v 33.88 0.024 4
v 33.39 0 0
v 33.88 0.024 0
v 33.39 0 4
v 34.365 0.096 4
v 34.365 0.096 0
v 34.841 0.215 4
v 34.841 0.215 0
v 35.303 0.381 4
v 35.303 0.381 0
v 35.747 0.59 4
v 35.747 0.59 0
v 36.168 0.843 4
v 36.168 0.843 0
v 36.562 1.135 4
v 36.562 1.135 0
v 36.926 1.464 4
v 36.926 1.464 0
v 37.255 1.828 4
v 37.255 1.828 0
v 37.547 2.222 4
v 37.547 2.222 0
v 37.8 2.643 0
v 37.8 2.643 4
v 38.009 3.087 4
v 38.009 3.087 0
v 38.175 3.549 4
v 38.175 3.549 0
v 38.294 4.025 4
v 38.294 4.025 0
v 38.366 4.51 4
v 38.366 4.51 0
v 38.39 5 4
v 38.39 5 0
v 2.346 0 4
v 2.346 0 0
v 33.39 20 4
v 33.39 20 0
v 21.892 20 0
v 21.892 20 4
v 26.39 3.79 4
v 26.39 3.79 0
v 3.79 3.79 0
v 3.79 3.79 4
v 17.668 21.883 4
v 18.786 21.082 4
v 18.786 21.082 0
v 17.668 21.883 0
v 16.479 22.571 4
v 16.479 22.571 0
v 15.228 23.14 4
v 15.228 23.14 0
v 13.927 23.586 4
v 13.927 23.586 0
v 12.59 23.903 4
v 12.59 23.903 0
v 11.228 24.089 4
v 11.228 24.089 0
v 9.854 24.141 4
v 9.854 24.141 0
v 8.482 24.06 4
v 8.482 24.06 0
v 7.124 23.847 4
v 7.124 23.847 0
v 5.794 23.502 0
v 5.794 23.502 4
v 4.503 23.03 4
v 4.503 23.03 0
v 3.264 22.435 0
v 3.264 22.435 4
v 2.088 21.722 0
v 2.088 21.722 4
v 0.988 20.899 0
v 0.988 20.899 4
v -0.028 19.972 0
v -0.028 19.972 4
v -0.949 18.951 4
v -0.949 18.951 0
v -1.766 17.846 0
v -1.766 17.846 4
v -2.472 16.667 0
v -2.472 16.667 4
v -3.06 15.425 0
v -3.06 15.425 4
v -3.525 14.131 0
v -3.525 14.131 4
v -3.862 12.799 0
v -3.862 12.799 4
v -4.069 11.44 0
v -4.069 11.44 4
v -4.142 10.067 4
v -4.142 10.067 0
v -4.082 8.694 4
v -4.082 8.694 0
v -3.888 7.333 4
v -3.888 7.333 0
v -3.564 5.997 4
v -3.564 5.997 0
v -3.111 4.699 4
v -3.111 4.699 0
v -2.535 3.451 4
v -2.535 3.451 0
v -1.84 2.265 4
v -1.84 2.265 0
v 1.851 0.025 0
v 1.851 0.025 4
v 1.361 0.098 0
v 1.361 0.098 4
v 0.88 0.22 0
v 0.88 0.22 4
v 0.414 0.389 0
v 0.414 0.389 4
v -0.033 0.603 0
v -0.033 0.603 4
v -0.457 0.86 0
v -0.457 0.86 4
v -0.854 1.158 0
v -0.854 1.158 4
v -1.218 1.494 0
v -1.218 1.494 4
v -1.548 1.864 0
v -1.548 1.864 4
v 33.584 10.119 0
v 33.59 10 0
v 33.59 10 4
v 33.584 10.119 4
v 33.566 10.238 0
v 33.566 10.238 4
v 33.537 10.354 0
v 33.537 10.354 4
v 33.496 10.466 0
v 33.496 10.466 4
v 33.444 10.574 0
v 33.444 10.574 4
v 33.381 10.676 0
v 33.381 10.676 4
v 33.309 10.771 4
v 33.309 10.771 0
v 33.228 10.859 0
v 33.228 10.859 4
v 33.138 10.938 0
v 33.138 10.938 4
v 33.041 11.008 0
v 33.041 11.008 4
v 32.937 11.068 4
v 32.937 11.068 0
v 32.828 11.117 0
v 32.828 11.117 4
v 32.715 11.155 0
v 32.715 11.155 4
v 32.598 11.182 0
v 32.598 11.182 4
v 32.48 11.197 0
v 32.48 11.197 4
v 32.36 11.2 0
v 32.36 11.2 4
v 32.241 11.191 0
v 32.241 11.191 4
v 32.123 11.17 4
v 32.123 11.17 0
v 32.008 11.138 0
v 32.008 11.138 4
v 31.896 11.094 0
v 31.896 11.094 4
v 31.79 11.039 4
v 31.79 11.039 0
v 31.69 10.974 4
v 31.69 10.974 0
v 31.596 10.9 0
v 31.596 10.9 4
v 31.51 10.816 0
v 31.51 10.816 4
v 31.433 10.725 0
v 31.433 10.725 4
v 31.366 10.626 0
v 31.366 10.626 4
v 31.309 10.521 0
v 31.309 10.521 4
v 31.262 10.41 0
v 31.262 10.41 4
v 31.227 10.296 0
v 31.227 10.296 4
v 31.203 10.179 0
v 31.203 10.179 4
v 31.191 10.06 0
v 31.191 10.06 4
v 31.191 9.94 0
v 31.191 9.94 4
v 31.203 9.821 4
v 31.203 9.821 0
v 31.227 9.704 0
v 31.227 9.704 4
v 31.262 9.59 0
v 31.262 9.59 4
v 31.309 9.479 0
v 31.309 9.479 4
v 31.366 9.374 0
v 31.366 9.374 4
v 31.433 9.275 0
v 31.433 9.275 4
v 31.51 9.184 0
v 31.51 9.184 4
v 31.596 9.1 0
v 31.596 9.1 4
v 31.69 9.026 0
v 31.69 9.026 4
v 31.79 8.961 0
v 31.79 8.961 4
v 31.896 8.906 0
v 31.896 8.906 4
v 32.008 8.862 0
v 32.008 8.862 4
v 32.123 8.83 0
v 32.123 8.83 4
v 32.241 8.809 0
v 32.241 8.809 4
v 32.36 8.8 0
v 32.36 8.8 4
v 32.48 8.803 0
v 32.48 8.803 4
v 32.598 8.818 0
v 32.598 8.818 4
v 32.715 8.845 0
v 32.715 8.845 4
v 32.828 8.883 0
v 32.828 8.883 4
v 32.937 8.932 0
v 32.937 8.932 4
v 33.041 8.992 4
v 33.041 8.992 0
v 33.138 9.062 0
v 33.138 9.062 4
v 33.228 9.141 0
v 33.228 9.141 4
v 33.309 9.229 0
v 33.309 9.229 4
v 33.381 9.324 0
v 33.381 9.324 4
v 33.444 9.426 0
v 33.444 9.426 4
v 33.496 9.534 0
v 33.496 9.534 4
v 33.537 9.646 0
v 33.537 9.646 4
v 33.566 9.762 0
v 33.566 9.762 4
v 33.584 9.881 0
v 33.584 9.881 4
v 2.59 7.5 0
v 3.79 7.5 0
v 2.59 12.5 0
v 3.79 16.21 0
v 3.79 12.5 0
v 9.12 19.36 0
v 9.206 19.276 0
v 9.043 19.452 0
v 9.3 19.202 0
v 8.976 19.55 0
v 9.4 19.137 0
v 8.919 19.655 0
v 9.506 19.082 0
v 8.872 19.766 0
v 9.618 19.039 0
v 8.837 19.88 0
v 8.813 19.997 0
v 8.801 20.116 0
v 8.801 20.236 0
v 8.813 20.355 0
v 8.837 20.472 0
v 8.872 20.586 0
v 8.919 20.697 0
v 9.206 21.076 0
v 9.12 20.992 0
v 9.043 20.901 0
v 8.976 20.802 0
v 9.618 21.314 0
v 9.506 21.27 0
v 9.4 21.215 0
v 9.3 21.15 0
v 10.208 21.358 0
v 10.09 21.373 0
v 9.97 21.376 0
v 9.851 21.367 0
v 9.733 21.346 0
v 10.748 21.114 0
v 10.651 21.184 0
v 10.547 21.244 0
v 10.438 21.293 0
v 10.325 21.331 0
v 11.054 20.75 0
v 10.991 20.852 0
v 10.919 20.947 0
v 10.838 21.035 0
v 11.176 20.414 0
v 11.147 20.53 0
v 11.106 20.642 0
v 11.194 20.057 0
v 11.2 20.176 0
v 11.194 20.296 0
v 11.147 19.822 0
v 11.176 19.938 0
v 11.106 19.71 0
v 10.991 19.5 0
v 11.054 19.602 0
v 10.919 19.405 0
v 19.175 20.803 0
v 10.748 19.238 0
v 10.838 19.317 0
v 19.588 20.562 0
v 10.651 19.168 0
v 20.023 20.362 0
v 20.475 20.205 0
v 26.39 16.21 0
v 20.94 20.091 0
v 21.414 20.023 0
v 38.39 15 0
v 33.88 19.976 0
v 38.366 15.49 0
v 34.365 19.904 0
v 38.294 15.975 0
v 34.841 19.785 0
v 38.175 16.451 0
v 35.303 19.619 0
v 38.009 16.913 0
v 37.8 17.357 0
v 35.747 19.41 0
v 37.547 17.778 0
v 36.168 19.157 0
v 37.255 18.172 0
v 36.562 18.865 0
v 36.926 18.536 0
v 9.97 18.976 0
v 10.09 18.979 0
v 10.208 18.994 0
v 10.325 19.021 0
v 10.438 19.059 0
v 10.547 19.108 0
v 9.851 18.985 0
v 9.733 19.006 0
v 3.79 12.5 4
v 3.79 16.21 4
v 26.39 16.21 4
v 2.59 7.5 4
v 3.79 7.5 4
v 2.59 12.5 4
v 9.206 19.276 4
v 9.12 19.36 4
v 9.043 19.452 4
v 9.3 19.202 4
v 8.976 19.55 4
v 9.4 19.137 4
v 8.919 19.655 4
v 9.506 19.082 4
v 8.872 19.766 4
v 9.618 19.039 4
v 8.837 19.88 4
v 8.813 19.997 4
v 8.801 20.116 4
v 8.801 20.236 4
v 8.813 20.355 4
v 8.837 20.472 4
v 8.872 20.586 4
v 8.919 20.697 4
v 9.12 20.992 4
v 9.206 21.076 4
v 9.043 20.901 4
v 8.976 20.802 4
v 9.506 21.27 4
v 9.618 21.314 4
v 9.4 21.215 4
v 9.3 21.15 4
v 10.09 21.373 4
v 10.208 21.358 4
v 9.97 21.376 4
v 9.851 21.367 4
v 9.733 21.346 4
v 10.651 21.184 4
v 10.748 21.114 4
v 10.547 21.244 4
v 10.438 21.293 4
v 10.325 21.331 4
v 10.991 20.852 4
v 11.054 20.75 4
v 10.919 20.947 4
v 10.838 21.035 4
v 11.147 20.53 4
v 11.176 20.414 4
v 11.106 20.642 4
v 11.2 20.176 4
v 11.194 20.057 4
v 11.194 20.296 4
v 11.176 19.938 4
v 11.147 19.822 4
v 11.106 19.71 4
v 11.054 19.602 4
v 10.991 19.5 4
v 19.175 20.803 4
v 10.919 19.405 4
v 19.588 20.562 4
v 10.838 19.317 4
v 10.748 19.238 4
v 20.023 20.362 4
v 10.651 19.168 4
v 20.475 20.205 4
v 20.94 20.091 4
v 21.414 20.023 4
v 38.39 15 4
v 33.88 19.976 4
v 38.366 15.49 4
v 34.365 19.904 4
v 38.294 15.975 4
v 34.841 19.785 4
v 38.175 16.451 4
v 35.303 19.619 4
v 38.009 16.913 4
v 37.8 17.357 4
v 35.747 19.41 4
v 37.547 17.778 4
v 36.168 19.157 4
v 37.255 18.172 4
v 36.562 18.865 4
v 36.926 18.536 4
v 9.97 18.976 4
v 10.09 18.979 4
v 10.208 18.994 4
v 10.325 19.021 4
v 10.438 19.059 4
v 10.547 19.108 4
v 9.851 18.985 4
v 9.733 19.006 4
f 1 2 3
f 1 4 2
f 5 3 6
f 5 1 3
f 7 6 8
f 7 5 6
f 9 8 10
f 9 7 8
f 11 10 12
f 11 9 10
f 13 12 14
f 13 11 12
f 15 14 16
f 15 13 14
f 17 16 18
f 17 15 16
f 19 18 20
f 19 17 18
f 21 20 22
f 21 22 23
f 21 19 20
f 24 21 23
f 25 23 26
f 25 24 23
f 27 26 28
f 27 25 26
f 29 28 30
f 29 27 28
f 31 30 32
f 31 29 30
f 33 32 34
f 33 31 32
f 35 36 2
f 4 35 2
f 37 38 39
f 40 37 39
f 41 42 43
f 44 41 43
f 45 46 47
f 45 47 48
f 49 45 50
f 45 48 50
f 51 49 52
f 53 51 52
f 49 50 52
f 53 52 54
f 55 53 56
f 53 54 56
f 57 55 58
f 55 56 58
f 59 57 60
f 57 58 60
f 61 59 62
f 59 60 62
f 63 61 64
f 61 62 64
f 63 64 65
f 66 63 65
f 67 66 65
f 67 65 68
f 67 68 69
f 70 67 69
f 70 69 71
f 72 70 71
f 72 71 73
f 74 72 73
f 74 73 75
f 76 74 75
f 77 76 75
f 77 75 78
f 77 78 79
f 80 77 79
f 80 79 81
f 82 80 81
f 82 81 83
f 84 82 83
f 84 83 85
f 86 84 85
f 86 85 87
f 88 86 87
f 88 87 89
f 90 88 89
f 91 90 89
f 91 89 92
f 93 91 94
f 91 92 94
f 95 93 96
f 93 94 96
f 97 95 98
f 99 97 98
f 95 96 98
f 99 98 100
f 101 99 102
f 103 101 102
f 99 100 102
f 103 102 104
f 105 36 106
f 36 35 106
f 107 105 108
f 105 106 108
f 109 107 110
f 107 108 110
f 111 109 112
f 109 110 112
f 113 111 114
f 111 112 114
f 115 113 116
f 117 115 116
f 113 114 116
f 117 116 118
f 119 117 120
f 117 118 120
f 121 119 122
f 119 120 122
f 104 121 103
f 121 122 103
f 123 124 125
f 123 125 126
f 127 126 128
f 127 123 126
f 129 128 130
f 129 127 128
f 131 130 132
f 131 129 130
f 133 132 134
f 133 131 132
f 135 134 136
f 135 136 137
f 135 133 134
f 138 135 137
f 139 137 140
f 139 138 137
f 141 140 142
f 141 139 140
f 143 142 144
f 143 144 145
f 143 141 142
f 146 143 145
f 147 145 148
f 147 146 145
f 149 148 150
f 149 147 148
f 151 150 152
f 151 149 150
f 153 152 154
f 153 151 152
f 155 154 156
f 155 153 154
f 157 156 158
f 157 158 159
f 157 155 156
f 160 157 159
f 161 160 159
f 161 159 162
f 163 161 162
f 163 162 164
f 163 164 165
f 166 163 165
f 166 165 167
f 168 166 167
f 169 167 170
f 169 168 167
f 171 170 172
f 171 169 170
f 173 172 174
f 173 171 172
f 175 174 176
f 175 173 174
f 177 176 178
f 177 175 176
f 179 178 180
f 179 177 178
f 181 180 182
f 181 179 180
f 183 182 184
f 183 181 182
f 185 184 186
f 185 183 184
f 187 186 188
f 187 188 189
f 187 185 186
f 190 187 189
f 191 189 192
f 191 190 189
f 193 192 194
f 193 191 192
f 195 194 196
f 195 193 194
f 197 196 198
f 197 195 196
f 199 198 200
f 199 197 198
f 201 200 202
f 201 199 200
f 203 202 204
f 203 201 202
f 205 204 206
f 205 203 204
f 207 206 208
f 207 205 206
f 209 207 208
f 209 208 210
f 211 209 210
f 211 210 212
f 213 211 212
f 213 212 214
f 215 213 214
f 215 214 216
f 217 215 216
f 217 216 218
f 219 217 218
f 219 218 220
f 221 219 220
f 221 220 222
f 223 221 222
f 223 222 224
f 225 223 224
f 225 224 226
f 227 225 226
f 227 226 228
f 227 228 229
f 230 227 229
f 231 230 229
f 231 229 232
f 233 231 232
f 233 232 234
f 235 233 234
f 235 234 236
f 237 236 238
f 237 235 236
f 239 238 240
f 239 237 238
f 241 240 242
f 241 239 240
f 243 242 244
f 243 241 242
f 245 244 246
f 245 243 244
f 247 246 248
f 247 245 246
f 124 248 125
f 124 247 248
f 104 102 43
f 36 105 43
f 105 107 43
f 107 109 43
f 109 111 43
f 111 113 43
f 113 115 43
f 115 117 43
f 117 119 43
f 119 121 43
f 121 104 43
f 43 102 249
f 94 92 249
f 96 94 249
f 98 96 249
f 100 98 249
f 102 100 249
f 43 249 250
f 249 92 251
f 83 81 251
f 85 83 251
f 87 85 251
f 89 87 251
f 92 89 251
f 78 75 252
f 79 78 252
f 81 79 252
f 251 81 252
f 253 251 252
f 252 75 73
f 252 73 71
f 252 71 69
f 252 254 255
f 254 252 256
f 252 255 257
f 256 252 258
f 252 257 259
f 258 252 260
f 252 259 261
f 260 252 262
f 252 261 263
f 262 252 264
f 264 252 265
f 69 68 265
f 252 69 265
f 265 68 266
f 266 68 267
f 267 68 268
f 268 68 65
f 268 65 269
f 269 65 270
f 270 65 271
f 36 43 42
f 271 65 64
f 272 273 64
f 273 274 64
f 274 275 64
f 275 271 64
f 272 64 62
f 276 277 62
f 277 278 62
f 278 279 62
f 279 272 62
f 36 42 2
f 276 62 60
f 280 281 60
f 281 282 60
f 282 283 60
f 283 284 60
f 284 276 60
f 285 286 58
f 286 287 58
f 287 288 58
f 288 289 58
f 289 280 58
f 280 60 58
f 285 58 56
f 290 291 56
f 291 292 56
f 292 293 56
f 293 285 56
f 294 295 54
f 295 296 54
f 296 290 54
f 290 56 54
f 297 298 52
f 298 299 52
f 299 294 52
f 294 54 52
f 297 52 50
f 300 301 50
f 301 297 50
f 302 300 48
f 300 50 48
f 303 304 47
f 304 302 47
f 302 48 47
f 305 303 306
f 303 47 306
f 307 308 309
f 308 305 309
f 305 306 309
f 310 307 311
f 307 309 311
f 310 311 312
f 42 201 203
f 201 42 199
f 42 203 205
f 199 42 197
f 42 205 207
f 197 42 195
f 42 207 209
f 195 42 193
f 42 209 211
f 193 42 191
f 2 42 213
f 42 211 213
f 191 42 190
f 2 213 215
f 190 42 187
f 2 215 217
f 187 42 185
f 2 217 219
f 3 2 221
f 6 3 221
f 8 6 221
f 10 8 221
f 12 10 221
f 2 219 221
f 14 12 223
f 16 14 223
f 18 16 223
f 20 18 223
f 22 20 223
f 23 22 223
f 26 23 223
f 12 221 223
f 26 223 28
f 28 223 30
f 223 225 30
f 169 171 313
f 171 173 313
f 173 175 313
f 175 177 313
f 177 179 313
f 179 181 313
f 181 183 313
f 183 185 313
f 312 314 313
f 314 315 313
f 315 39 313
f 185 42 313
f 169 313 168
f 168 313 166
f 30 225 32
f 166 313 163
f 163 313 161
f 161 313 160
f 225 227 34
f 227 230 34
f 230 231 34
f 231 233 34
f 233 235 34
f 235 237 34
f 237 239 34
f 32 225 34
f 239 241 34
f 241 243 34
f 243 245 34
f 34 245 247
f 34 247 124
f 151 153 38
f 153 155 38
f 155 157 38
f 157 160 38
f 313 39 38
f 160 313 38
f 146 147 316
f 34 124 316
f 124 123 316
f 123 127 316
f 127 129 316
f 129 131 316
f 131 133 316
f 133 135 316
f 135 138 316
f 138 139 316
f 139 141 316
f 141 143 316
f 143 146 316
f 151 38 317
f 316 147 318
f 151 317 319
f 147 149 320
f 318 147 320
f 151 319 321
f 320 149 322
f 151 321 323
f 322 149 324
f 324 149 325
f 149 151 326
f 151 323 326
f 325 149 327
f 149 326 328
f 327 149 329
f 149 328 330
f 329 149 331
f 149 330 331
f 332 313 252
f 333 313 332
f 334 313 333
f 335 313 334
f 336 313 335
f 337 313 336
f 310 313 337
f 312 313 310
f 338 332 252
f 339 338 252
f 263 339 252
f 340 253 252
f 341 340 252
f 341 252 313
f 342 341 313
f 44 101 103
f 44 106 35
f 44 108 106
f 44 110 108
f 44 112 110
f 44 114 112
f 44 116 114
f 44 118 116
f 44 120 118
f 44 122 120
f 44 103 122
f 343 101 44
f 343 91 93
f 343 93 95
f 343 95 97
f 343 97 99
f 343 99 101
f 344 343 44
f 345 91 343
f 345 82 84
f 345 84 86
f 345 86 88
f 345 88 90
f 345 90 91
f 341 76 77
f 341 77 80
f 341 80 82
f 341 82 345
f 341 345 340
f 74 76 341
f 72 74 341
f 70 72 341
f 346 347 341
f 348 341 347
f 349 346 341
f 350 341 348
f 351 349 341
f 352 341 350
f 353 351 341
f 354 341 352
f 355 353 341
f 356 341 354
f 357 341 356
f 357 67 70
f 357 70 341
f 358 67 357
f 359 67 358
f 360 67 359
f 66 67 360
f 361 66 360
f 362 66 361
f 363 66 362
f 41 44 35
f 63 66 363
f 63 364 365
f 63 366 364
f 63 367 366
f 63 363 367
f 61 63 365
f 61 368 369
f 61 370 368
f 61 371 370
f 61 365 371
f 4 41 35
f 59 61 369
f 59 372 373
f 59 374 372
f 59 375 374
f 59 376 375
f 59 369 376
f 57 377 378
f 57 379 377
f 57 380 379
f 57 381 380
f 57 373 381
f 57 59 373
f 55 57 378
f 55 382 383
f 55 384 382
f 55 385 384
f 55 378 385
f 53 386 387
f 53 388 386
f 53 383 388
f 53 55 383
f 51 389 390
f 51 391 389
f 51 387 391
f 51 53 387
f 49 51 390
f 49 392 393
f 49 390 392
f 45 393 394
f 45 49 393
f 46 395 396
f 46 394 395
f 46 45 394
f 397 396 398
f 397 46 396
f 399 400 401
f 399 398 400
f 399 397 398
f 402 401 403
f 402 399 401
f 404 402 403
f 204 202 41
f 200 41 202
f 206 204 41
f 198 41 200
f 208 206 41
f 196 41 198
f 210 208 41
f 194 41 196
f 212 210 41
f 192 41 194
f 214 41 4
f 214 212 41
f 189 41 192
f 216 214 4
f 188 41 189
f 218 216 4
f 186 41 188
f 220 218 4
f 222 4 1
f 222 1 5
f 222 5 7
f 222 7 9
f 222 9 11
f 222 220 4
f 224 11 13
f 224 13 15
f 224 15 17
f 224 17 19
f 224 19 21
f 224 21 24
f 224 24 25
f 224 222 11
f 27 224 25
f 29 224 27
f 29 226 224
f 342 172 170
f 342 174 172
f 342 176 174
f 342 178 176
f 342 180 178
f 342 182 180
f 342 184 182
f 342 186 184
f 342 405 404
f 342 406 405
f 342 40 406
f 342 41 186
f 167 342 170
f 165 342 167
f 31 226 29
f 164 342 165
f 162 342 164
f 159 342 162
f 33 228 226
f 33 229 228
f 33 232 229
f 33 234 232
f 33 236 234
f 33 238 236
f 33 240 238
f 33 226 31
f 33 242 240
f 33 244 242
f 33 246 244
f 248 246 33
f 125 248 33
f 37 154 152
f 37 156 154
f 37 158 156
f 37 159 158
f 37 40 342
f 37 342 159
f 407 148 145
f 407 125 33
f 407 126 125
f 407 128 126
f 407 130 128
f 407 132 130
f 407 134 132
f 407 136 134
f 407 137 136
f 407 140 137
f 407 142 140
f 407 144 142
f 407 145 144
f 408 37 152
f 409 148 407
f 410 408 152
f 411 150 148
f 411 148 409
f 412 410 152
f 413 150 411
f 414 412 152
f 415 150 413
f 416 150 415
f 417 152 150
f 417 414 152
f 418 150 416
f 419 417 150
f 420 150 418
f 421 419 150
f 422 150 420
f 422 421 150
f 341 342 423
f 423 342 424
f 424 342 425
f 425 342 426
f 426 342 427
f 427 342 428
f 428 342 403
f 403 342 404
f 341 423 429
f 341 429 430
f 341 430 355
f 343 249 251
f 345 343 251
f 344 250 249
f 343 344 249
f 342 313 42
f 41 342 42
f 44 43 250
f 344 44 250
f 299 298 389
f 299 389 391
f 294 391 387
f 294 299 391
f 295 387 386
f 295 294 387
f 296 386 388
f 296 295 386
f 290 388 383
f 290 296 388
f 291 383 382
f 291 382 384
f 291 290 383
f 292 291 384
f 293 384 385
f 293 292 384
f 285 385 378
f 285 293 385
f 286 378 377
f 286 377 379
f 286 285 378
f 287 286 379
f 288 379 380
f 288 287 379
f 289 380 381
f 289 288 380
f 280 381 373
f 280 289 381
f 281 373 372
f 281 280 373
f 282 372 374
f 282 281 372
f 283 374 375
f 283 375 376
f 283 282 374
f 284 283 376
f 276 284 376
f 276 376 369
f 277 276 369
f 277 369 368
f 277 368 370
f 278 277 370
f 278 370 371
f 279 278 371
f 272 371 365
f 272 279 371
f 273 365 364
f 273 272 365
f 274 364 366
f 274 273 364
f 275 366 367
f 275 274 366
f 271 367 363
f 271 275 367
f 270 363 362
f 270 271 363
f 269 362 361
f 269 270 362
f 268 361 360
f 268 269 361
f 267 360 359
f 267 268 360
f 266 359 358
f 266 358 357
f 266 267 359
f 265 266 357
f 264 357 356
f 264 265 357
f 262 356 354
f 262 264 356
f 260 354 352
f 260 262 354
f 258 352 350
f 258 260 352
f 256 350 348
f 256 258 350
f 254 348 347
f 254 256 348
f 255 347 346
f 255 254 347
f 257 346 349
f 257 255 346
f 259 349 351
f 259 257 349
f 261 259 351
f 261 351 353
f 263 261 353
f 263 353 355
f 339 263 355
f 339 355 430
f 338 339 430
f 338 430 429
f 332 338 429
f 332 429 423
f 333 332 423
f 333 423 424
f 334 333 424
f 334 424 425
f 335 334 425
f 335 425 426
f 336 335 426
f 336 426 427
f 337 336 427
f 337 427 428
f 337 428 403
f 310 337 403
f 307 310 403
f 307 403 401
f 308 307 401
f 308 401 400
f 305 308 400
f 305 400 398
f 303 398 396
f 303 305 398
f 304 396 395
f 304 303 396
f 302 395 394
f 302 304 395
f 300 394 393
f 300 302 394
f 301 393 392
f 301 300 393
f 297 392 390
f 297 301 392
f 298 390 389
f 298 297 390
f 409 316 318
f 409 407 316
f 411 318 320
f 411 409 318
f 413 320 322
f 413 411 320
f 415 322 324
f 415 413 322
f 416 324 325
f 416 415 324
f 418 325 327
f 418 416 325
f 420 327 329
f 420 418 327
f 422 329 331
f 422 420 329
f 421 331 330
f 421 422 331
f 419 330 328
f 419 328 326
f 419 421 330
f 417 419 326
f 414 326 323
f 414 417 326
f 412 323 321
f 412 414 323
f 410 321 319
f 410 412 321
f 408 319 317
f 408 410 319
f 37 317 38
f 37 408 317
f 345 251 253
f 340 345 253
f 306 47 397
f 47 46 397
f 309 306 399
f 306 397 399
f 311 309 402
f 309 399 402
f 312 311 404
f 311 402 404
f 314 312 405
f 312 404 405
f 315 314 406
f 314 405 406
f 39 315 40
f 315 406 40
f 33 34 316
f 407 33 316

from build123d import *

# Parameters (mm, degrees)
SKETCH1_R           = 1.2
BOSS_EXTRUDE1_DEPTH = 4
FILLET1_R           = 5


with BuildPart() as part:
    # Sketch1 → Boss-Extrude1 (new body)
    with BuildSketch(Plane.XY):
        with BuildLine():
            Line((0, 0), (38.39, 0))
            Line((38.39, 0), (38.39, 20))
            Line((38.39, 20), (20, 20))
            ThreePointArc((20, 20), (0, 20), (0, 0))
        make_face()
        Polygon((3.79, 3.79), (3.79, 7.5), (2.59, 7.5), (2.59, 12.5), (3.79, 12.5), (3.79, 16.21), (26.39, 16.21), (26.39, 3.79), align=None, mode=Mode.SUBTRACT)
        with Locations((10, 20.176067812)):
            Circle(SKETCH1_R, mode=Mode.SUBTRACT)
        with Locations((32.39, 10)):
            Circle(SKETCH1_R, mode=Mode.SUBTRACT)
    extrude(amount=BOSS_EXTRUDE1_DEPTH)

    # Fillet1
    fillet1_edges = [part.edges().sort_by_distance(p)[0] for p in [
        (38.39, 20, 2),
        (38.39, 0, 2),
        (0, 0, 2),
        (20, 20, 2),
    ]]
    fillet(fillet1_edges, radius=FILLET1_R)


solid = part.part
